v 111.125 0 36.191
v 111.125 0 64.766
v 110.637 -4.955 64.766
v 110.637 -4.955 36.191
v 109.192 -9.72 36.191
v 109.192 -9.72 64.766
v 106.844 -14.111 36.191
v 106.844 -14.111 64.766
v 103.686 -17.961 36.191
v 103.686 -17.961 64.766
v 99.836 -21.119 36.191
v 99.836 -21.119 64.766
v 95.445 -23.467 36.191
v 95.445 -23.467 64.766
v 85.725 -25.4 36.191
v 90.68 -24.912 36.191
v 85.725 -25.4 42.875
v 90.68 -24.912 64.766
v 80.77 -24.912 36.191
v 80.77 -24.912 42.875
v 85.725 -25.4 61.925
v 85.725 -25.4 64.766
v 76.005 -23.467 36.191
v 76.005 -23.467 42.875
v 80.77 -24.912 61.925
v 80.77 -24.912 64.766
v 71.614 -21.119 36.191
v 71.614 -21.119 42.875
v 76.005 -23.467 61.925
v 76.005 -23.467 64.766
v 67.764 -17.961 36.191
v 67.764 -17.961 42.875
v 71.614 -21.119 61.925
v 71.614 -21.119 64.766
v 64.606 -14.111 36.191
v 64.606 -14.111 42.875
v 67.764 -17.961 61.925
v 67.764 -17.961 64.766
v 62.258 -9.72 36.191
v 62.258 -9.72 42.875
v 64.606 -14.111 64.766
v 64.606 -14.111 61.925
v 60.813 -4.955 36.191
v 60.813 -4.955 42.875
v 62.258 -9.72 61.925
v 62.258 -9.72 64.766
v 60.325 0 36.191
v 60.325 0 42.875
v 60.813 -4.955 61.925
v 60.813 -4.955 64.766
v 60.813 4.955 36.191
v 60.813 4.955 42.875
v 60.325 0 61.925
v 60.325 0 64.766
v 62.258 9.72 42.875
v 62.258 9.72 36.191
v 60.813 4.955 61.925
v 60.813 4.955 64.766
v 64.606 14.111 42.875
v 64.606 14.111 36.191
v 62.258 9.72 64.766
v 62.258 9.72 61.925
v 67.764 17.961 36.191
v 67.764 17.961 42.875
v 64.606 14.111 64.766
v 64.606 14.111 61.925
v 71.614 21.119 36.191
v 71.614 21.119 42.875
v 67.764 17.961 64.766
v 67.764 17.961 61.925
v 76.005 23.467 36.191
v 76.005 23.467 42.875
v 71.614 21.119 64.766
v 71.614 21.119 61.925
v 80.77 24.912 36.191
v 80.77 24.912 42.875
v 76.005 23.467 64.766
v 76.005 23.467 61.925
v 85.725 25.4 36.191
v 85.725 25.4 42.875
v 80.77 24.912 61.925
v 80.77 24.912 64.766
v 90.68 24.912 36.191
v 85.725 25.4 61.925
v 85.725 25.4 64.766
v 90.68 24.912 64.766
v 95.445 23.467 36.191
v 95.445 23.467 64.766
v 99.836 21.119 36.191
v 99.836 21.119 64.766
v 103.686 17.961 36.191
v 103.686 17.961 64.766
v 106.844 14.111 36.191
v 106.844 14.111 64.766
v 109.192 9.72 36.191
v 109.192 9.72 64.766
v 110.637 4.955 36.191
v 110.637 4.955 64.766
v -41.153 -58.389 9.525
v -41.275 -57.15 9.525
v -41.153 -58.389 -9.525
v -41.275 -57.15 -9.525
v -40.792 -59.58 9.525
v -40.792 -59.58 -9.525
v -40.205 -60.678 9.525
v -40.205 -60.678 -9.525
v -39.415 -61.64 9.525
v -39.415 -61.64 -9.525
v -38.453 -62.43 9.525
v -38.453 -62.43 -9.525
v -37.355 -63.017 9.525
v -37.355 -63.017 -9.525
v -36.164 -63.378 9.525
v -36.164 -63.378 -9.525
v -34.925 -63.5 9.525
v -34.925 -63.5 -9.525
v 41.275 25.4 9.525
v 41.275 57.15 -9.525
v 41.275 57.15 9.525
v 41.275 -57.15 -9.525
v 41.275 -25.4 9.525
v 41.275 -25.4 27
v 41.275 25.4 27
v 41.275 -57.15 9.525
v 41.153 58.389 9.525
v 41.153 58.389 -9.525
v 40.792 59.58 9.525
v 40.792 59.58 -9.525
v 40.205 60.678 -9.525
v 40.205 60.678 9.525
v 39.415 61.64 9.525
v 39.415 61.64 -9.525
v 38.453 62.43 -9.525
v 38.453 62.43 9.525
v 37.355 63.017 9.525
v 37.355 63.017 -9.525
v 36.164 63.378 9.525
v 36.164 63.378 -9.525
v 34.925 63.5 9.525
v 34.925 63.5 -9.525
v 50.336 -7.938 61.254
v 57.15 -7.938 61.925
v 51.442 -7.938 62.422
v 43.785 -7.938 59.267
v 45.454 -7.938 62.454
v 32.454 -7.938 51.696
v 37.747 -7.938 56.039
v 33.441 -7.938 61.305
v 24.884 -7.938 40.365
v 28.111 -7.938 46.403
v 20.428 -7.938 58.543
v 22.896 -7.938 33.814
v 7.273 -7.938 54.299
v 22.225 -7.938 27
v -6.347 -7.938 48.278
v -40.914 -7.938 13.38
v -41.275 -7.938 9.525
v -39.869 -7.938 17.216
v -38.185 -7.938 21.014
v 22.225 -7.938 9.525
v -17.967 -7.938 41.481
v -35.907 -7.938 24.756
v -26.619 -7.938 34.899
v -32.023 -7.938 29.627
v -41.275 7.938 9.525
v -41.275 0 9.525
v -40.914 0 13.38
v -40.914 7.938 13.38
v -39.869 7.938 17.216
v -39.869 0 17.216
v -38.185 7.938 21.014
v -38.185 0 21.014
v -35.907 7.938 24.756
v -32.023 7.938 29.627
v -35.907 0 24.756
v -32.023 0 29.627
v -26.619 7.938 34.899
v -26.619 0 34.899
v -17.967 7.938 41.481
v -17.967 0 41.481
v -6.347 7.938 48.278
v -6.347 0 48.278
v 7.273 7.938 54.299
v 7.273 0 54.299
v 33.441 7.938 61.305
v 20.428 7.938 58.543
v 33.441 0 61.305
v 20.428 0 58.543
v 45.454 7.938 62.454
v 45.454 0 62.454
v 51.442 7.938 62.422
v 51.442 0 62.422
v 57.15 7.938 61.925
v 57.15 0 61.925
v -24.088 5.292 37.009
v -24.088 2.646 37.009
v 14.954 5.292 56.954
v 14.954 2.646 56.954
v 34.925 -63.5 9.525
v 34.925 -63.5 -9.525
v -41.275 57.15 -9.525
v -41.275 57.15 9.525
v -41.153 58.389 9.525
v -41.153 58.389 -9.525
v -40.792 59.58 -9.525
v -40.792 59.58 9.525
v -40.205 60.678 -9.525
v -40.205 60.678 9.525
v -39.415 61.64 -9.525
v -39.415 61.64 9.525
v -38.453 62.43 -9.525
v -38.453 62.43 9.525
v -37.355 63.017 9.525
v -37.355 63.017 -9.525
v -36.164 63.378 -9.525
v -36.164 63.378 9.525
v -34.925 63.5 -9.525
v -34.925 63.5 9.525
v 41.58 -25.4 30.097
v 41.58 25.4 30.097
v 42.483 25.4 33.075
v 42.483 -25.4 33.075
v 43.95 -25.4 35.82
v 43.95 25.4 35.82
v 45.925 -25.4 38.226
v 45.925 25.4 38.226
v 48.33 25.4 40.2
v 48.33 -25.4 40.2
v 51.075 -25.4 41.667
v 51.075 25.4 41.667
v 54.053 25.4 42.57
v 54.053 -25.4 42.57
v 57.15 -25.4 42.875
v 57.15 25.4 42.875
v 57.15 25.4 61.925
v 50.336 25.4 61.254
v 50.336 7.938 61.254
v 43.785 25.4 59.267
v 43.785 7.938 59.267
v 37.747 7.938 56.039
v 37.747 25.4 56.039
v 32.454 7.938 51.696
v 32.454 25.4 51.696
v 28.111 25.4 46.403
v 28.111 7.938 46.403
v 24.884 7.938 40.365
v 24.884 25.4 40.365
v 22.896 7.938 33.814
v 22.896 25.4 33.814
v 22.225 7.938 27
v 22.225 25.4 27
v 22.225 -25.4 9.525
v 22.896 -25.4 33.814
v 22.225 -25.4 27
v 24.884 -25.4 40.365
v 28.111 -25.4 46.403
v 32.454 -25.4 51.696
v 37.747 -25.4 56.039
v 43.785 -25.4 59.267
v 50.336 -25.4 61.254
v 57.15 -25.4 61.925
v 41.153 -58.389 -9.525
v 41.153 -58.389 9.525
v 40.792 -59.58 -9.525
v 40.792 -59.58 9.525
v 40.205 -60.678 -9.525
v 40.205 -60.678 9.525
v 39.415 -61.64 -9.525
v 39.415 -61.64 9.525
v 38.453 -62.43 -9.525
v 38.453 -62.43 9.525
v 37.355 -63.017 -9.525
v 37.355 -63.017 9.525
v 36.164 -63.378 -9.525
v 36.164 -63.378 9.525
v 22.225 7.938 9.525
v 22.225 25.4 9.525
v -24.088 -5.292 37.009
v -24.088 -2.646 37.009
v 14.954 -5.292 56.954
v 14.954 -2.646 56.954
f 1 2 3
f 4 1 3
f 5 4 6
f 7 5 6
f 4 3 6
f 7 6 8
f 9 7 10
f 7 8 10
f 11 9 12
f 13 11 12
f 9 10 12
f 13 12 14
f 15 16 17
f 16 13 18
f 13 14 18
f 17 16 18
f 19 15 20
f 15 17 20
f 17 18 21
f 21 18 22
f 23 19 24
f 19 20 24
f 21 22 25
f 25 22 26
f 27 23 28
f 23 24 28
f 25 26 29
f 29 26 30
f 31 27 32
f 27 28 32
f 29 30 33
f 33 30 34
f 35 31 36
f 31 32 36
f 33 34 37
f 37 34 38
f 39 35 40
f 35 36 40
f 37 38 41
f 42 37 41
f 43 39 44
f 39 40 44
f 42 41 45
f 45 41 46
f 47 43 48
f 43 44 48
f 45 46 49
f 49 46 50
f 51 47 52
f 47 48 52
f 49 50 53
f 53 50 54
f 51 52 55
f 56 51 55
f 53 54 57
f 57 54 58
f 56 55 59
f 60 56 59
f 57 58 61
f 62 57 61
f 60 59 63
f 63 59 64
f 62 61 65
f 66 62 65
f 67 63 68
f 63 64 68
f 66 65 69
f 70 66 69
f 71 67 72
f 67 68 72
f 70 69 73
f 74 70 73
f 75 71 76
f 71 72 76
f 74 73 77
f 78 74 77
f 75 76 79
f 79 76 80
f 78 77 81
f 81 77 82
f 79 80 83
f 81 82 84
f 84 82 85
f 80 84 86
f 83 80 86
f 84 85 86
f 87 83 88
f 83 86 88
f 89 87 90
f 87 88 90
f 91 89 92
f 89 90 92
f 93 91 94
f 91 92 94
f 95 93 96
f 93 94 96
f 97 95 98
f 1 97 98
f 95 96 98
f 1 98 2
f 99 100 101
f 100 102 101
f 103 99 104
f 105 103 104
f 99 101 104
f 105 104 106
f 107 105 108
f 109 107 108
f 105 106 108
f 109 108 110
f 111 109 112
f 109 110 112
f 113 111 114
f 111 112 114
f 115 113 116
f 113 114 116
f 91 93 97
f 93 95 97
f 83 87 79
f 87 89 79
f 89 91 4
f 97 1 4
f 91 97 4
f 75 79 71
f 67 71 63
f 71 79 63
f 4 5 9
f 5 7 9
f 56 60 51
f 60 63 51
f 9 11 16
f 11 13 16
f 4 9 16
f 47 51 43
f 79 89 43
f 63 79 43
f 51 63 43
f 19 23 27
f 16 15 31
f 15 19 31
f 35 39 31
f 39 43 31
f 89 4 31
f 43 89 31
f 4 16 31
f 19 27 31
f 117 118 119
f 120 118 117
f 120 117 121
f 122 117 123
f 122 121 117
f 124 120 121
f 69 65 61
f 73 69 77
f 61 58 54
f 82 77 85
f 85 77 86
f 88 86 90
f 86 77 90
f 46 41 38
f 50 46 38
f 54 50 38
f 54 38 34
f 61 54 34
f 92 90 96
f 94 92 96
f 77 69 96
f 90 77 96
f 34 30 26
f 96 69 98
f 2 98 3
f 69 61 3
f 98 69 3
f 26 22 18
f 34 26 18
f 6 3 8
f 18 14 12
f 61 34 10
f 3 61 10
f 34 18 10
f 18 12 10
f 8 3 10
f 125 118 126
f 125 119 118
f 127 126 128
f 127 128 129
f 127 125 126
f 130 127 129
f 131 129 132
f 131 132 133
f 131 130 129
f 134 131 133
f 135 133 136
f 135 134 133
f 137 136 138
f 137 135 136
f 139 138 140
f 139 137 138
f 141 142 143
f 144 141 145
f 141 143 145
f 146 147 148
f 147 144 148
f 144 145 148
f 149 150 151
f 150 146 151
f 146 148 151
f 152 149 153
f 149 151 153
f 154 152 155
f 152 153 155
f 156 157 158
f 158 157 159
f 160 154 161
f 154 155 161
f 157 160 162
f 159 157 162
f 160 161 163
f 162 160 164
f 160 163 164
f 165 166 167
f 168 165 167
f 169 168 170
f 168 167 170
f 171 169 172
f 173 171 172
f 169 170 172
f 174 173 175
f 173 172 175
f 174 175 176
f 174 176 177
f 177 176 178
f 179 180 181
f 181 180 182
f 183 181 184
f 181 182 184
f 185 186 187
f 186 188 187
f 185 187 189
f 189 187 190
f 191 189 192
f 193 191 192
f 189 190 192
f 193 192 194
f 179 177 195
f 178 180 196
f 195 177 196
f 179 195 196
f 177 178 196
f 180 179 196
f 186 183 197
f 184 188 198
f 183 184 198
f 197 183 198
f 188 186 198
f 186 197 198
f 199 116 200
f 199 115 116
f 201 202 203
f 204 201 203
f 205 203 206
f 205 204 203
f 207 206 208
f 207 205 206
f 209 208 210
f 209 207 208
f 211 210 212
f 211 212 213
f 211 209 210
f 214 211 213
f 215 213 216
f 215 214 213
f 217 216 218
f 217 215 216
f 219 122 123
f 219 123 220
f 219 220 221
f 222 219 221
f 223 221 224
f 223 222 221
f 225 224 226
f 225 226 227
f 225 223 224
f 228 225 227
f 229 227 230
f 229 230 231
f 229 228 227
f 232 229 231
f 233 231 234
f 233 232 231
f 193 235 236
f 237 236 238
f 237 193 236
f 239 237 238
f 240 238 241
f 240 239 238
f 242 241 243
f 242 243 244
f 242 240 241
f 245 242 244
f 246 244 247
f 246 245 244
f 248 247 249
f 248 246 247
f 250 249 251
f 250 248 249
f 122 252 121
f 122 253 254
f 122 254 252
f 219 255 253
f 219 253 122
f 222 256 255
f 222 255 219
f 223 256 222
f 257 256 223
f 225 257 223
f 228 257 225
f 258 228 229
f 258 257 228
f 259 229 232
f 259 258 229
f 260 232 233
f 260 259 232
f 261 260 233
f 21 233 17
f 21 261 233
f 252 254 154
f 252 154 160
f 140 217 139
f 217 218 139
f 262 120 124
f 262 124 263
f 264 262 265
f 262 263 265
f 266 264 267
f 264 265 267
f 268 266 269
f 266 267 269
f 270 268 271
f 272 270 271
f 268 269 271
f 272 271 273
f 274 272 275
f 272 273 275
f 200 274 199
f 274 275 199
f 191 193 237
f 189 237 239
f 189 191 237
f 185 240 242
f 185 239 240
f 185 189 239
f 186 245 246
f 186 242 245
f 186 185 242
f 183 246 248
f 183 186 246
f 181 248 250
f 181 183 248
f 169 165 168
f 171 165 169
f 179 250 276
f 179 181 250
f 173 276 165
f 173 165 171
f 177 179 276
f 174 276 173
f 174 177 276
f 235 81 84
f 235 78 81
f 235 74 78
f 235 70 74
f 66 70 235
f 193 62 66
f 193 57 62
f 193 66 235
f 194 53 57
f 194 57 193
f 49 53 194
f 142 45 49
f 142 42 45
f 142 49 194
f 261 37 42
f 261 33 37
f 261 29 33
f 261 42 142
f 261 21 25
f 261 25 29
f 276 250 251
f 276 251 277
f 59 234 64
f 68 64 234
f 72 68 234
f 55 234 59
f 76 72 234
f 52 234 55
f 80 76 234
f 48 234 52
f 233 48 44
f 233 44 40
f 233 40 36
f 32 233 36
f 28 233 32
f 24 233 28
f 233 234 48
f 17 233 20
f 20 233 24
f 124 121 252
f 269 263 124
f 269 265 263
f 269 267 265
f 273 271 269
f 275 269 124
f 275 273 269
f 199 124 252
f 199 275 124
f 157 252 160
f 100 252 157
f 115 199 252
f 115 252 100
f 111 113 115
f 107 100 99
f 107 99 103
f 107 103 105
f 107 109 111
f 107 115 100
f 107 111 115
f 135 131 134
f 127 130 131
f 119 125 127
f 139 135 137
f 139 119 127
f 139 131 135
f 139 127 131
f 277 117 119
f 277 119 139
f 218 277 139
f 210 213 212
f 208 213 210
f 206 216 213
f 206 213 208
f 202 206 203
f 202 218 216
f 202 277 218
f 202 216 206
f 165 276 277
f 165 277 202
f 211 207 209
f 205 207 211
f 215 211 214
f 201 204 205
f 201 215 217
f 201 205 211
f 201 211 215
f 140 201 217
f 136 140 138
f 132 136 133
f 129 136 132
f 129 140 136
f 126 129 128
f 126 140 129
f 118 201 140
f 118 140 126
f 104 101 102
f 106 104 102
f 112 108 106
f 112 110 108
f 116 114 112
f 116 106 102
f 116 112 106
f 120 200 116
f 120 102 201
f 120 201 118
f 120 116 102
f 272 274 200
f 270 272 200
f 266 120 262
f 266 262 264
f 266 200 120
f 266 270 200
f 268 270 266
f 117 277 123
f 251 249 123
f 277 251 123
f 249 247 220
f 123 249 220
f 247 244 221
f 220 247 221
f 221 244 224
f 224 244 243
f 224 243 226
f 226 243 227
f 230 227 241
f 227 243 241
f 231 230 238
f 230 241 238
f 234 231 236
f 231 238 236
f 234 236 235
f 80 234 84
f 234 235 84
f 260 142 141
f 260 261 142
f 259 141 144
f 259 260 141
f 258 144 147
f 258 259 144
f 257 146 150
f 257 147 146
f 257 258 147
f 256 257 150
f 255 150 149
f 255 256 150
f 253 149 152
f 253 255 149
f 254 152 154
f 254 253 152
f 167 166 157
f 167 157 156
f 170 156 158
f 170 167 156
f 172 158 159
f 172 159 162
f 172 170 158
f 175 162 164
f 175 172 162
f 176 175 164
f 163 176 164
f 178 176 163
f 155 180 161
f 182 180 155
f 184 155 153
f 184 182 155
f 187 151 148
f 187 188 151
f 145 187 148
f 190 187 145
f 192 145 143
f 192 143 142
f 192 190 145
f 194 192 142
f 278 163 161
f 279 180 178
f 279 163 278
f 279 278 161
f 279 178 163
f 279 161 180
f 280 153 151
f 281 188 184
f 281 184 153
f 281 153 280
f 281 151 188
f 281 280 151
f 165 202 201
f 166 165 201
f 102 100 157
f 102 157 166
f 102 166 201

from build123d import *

# Parameters (mm, degrees)
F1_DEPTH = 63.5
F2_DEPTH = 25.4
F3_DEPTH = 7.9375
F5_R     = 6.35


with BuildPart() as f1:
    # F0 (on Front) → F1 (new body, symmetric)
    with BuildSketch(Plane.XZ):
        Polygon((-41.275, -9.525), (41.275, -9.525), (41.275, 9.525), (22.225, 9.525), (-41.275, 9.525), align=None)
    extrude(amount=F1_DEPTH, both=True)

    # F0 (on Front) → F2 (join, symmetric)
    with BuildSketch(Plane.XZ):
        with BuildLine():
            Line((22.225, 9.525), (41.275, 9.525))
            Line((41.275, 9.525), (41.275, 27.0002))
            ThreePointArc((41.275, 27.0002), (45.9246798487, 38.2255201513), (57.15, 42.8752))
            Line((57.15, 42.8752), (60.325, 42.8752))
            Line((60.325, 42.8752), (60.325, 61.9252))
            Line((60.325, 61.9252), (57.15, 61.9252))
            ThreePointArc((57.15, 61.9252), (32.4542956671, 51.6959043329), (22.225, 27.0002))
            Line((22.225, 27.0002), (22.225, 9.525))
        make_face()
        Polygon((85.725, 61.9252), (60.325, 61.9252), (60.325, 42.8752), (85.725, 42.8752), (85.725, 50.4787749963), align=None)
    extrude(amount=F2_DEPTH, both=True)

    # F0 (on Front) → F3 (join, symmetric)
    with BuildSketch(Plane.XZ):
        with BuildLine():
            add(Edge.make_bspline(
                [(-41.275, 9.525), (-41.2498526275, 38.3011959493), (19.6118596941, 66.9183731079), (57.15, 61.9252)],
                knots=[0, 0, 0, 0, 111.5045361635, 111.5045361635, 111.5045361635, 111.5045361635], degree=3))
            Line((-41.275, 9.525), (22.225, 9.525))
            Line((22.225, 9.525), (22.225, 27.0002))
            ThreePointArc((22.225, 27.0002), (32.4542956671, 51.6959043329), (57.15, 61.9252))
        make_face()
    extrude(amount=F3_DEPTH, both=True)

    # F0 (on Front) → F4 (revolve)
    with BuildSketch(Plane.XZ):
        Polygon((85.725, 64.7662749963), (85.725, 61.9252), (85.725, 50.4787749963), (85.725, 42.8752), (85.725, 36.1912749963), (111.125, 36.1912749963), (111.125, 64.7662749963), align=None)
    revolve(axis=Axis((85.725, 0, 50.4787749963), (0, 0, -1)))

    # F5
    f5_edges = [f1.edges().sort_by_distance(p)[0] for p in [
        (-41.275, -63.5, 0),
        (41.275, -63.5, 0),
        (41.275, 63.5, 0),
        (-41.275, 63.5, 0),
    ]]
    fillet(f5_edges, radius=F5_R)


solid = f1.part
